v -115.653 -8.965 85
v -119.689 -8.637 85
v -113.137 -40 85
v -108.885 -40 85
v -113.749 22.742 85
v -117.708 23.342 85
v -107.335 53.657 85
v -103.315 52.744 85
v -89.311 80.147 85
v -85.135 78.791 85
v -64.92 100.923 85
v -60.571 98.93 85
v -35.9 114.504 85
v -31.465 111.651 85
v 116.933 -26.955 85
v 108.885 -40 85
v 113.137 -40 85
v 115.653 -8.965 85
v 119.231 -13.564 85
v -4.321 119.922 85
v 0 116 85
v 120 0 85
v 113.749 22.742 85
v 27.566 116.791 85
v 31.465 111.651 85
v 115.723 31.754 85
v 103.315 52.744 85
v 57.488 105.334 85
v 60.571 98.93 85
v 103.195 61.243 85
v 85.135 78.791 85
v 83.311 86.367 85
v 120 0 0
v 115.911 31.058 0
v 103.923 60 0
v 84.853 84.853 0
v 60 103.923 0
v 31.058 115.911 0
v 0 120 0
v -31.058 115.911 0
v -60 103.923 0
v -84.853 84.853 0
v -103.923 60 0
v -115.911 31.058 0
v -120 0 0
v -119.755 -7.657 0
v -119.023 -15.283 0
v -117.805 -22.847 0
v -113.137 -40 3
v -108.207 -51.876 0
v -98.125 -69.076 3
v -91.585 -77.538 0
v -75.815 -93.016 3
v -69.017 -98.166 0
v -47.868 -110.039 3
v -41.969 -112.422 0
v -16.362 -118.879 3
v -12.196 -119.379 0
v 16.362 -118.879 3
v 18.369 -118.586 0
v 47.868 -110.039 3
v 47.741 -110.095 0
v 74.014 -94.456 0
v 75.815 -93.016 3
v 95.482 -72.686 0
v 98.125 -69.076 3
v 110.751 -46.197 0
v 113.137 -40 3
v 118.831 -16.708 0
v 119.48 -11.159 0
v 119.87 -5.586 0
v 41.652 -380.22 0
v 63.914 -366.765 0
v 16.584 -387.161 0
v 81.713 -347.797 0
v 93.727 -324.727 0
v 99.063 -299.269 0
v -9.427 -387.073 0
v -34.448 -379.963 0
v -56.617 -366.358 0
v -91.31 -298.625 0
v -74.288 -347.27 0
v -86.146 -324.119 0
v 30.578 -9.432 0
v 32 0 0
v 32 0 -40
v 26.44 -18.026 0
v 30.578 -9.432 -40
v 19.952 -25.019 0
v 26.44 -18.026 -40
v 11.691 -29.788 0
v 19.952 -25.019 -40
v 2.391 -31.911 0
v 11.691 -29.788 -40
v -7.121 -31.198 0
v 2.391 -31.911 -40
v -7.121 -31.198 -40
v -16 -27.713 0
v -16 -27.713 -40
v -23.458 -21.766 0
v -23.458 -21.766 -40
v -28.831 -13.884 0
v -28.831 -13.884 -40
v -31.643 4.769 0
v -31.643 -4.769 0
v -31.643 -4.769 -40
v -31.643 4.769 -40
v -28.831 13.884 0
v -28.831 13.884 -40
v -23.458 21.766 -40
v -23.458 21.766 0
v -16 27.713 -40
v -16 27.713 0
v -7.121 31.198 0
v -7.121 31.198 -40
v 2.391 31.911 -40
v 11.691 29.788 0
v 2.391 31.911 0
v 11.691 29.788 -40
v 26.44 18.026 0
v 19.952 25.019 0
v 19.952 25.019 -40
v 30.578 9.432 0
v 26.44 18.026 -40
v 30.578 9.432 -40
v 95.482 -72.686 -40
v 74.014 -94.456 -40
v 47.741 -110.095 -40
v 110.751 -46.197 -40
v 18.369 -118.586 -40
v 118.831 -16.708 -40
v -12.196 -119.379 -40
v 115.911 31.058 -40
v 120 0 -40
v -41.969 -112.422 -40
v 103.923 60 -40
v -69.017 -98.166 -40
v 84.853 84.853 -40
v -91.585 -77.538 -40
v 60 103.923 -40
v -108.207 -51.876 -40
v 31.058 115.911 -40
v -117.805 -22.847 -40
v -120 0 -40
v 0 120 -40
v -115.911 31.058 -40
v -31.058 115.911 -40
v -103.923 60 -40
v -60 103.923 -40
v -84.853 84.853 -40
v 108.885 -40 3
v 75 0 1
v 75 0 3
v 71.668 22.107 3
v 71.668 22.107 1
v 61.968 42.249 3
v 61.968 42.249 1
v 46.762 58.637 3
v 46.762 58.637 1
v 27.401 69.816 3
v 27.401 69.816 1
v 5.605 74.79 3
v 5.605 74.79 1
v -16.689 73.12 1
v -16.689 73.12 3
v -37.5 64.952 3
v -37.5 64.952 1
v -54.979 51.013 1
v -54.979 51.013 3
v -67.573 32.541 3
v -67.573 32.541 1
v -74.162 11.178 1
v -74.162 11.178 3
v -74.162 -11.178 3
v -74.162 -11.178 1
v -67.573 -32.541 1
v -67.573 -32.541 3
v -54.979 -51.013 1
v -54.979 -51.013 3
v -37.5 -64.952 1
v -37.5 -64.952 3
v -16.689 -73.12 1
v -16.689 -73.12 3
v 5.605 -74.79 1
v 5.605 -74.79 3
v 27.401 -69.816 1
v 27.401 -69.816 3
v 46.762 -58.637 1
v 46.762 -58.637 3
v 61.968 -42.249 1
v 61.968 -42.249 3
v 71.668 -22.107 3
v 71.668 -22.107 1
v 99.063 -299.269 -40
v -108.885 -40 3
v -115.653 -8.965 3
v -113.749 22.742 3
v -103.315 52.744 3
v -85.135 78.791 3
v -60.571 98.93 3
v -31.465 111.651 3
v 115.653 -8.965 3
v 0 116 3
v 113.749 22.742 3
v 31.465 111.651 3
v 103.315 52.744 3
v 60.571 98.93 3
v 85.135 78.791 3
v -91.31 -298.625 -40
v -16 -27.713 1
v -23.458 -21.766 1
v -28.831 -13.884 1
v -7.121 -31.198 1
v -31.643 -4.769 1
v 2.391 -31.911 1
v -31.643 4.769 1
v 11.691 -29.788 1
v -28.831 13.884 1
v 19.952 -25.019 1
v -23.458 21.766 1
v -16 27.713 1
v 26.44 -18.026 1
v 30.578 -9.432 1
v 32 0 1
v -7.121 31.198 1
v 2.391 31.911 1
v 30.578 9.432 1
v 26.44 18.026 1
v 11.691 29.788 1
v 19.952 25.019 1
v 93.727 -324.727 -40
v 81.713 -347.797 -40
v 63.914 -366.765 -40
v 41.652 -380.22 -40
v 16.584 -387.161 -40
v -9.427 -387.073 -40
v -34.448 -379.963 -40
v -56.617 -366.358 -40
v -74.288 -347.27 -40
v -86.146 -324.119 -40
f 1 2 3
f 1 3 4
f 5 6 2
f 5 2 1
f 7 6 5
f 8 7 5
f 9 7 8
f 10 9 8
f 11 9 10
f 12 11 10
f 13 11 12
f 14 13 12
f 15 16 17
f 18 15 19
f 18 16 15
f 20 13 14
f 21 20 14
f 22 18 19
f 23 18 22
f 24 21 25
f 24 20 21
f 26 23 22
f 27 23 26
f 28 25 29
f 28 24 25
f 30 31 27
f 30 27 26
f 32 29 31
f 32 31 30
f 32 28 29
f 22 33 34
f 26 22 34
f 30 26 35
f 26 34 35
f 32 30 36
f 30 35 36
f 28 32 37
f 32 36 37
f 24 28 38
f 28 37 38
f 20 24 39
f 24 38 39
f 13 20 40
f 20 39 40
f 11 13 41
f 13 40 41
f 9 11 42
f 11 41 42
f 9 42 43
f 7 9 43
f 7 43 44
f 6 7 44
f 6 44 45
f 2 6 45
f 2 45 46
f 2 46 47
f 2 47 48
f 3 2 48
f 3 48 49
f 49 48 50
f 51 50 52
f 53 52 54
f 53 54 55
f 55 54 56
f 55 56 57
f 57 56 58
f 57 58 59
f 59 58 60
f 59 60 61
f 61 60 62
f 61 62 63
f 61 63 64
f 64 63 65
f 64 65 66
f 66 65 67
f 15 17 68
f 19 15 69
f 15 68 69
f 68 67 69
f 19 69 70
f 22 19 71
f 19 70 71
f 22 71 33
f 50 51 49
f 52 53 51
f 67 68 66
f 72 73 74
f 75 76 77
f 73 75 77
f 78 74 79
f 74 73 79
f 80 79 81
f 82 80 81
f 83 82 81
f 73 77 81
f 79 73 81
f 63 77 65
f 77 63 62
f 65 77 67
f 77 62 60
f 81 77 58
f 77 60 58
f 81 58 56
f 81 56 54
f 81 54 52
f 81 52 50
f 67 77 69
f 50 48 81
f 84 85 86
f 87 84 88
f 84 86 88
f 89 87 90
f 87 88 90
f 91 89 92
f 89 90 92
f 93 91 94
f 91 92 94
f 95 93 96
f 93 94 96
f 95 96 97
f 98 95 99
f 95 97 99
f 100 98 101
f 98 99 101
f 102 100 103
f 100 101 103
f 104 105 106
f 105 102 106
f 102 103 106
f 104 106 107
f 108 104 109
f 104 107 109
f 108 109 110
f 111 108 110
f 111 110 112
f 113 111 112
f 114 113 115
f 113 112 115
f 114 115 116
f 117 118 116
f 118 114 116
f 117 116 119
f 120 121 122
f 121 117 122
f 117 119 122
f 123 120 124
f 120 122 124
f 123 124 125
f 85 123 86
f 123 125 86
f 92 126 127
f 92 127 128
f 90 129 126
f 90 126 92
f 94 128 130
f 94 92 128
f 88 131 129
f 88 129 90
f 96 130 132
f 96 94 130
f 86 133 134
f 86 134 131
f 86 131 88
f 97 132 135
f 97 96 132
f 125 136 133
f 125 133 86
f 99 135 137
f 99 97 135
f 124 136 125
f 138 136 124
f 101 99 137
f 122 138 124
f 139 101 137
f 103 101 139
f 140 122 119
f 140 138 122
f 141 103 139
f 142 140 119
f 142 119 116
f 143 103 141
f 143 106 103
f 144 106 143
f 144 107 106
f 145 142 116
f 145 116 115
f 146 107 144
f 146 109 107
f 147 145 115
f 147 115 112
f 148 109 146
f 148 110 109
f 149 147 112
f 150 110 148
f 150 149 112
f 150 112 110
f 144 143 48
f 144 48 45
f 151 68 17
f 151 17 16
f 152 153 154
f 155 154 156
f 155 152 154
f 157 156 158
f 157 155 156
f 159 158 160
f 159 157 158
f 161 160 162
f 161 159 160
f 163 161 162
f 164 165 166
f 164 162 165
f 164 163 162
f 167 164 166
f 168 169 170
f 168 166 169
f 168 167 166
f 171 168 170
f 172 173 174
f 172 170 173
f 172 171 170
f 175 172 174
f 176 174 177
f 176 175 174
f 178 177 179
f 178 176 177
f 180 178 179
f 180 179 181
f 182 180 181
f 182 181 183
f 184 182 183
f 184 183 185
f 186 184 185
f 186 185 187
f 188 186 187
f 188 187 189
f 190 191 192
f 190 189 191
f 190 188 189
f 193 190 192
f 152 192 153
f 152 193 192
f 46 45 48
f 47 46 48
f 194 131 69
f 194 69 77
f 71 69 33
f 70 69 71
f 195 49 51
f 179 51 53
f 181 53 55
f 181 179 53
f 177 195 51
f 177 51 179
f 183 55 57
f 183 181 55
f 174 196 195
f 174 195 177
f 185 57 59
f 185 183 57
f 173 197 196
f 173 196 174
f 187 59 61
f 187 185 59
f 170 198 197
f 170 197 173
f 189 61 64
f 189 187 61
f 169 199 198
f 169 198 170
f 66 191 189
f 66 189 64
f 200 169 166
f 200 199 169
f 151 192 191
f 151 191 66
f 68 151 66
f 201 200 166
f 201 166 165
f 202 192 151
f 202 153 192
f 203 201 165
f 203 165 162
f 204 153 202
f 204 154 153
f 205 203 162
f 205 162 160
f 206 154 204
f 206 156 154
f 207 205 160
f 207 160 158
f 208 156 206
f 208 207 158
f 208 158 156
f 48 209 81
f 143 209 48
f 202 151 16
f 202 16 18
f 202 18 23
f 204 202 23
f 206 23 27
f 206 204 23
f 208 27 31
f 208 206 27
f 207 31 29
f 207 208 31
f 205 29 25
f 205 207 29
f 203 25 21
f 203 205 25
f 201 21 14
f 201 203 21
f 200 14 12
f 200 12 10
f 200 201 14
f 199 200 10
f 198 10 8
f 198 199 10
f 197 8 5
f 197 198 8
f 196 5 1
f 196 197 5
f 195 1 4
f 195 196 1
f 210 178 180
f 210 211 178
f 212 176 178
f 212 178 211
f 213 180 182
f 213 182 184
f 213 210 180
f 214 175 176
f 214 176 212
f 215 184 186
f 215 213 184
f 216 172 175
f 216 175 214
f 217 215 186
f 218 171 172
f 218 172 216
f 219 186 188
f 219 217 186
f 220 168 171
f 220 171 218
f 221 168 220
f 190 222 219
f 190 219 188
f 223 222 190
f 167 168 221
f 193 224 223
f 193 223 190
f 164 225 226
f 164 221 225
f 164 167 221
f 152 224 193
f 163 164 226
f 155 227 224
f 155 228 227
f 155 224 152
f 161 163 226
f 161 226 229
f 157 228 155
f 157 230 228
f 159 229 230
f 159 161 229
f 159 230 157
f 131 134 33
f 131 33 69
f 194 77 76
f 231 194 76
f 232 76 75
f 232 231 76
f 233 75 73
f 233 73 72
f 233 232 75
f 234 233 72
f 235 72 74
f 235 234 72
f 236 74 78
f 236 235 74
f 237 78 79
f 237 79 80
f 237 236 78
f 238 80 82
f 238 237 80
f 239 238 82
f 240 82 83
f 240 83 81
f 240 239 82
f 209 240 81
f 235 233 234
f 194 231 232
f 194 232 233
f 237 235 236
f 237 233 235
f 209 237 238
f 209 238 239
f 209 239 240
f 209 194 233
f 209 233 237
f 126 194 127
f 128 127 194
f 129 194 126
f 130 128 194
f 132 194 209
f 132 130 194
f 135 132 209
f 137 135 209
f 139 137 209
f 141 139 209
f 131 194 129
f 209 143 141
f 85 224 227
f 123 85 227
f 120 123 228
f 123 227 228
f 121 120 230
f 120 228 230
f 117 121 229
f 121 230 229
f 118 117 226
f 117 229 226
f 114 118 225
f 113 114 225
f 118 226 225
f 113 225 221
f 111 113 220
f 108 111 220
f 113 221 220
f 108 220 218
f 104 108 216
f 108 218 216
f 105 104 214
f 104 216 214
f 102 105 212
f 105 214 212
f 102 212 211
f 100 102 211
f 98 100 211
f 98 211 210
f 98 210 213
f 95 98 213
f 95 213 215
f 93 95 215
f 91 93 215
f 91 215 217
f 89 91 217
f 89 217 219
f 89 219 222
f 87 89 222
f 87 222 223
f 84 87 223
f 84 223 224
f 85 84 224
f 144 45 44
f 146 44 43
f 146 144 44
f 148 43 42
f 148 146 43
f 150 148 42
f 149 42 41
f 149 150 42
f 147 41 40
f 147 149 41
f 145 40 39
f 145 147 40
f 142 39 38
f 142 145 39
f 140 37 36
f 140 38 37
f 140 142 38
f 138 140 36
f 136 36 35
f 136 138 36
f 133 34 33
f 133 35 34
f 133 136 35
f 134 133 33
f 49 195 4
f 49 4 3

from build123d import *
from build123d.topology import SkipClean

# Parameters (mm, degrees)
SKETCH2_R               = 120
BOSS_EXTRUDE2_DEPTH     = 85
CUT_EXTRUDE1_START      = -82
CUT_EXTRUDE1_DEPTH      = 82
CUT_EXTRUDE5_DEPTH      = 2
CUT_EXTRUDE5_DEPTH_BACK = 2
SKETCH8_R               = 75
SKETCH9_R               = 32
CUT_EXTRUDE6_DEPTH      = 5
BOSS_EXTRUDE4_START     = 40
SKETCH12_R              = 32
BOSS_EXTRUDE4_DEPTH     = 40


with BuildPart() as part:
    # Sketch2 → Boss-Extrude2 (new body)
    with BuildSketch(Plane.XY):
        Circle(SKETCH2_R)
    extrude(amount=BOSS_EXTRUDE2_DEPTH)

    # Sketch3 → Cut-Extrude1 (cut)
    with BuildSketch(Plane.XY.offset(85).offset(CUT_EXTRUDE1_START)):
        with BuildLine():
            Line((-108.885260711, -40), (-113.13708499, -40))
            ThreePointArc((-113.13708499, -40), (0, -120), (113.13708499, -40))
            Line((113.13708499, -40), (108.885260711, -40))
            ThreePointArc((108.885260711, -40), (0, 116), (-108.885260711, -40))
        make_face()
    extrude(amount=CUT_EXTRUDE1_DEPTH, mode=Mode.SUBTRACT)

    # Sketch8 → Cut-Extrude5 (cut, two sides: drawn at the far end of the back side and taken through both)
    with BuildSketch(Plane.XY.offset(3).offset(-CUT_EXTRUDE5_DEPTH_BACK)):
        Circle(SKETCH8_R)
    extrude(amount=CUT_EXTRUDE5_DEPTH + CUT_EXTRUDE5_DEPTH_BACK, mode=Mode.SUBTRACT)

    # Sketch9 → Cut-Extrude6 (cut)
    with BuildSketch(Plane.XY.offset(1)):
        Circle(SKETCH9_R)
    extrude(amount=-CUT_EXTRUDE6_DEPTH, mode=Mode.SUBTRACT)

    # Sketch12 → Boss-Extrude4 (add)
    # profile 1 of 2: a face of its own
    with SkipClean():  # the faces are left unmerged after this step: merging them gives an invalid solid
        with BuildSketch(Plane(origin=(0, 0, 0), x_dir=(-1, 0, 0), z_dir=(0, 0, -1)).offset(BOSS_EXTRUDE4_START)):
            with BuildLine():
                ThreePointArc((120, 0), (0, 120), (-120, 0))
                Line((-120, 0), (-118.831087629, -16.70845932))
                ThreePointArc((-118.831087629, -16.70845932), (-3.111785776, -119.959646504), (117.805011812, -22.84686394))
                Line((117.805011812, -22.84686394), (120, 0))
            make_face()
            with Locations(Location((0, 0, 0), (0, 0, 180))):
                Circle(SKETCH12_R, mode=Mode.SUBTRACT)
        # profile 2 of 2: a face of its own
        with BuildSketch(Plane(origin=(0, 0, 0), x_dir=(-1, 0, 0), z_dir=(0, 0, -1)).offset(BOSS_EXTRUDE4_START)):
            with BuildLine():
                ThreePointArc((117.805011812, -22.84686394), (-3.111785776, -119.959646504), (-118.831087629, -16.70845932))
                Line((-118.831087629, -16.70845932), (-99.063378042, -299.268538041))
                ThreePointArc((-99.063378042, -299.268538041), (-3.575656086, -388.008129656), (91.309922092, -298.624981255))
                Line((91.309922092, -298.624981255), (117.805011812, -22.84686394))
            make_face()
        extrude(amount=-BOSS_EXTRUDE4_DEPTH)


solid = part.part
